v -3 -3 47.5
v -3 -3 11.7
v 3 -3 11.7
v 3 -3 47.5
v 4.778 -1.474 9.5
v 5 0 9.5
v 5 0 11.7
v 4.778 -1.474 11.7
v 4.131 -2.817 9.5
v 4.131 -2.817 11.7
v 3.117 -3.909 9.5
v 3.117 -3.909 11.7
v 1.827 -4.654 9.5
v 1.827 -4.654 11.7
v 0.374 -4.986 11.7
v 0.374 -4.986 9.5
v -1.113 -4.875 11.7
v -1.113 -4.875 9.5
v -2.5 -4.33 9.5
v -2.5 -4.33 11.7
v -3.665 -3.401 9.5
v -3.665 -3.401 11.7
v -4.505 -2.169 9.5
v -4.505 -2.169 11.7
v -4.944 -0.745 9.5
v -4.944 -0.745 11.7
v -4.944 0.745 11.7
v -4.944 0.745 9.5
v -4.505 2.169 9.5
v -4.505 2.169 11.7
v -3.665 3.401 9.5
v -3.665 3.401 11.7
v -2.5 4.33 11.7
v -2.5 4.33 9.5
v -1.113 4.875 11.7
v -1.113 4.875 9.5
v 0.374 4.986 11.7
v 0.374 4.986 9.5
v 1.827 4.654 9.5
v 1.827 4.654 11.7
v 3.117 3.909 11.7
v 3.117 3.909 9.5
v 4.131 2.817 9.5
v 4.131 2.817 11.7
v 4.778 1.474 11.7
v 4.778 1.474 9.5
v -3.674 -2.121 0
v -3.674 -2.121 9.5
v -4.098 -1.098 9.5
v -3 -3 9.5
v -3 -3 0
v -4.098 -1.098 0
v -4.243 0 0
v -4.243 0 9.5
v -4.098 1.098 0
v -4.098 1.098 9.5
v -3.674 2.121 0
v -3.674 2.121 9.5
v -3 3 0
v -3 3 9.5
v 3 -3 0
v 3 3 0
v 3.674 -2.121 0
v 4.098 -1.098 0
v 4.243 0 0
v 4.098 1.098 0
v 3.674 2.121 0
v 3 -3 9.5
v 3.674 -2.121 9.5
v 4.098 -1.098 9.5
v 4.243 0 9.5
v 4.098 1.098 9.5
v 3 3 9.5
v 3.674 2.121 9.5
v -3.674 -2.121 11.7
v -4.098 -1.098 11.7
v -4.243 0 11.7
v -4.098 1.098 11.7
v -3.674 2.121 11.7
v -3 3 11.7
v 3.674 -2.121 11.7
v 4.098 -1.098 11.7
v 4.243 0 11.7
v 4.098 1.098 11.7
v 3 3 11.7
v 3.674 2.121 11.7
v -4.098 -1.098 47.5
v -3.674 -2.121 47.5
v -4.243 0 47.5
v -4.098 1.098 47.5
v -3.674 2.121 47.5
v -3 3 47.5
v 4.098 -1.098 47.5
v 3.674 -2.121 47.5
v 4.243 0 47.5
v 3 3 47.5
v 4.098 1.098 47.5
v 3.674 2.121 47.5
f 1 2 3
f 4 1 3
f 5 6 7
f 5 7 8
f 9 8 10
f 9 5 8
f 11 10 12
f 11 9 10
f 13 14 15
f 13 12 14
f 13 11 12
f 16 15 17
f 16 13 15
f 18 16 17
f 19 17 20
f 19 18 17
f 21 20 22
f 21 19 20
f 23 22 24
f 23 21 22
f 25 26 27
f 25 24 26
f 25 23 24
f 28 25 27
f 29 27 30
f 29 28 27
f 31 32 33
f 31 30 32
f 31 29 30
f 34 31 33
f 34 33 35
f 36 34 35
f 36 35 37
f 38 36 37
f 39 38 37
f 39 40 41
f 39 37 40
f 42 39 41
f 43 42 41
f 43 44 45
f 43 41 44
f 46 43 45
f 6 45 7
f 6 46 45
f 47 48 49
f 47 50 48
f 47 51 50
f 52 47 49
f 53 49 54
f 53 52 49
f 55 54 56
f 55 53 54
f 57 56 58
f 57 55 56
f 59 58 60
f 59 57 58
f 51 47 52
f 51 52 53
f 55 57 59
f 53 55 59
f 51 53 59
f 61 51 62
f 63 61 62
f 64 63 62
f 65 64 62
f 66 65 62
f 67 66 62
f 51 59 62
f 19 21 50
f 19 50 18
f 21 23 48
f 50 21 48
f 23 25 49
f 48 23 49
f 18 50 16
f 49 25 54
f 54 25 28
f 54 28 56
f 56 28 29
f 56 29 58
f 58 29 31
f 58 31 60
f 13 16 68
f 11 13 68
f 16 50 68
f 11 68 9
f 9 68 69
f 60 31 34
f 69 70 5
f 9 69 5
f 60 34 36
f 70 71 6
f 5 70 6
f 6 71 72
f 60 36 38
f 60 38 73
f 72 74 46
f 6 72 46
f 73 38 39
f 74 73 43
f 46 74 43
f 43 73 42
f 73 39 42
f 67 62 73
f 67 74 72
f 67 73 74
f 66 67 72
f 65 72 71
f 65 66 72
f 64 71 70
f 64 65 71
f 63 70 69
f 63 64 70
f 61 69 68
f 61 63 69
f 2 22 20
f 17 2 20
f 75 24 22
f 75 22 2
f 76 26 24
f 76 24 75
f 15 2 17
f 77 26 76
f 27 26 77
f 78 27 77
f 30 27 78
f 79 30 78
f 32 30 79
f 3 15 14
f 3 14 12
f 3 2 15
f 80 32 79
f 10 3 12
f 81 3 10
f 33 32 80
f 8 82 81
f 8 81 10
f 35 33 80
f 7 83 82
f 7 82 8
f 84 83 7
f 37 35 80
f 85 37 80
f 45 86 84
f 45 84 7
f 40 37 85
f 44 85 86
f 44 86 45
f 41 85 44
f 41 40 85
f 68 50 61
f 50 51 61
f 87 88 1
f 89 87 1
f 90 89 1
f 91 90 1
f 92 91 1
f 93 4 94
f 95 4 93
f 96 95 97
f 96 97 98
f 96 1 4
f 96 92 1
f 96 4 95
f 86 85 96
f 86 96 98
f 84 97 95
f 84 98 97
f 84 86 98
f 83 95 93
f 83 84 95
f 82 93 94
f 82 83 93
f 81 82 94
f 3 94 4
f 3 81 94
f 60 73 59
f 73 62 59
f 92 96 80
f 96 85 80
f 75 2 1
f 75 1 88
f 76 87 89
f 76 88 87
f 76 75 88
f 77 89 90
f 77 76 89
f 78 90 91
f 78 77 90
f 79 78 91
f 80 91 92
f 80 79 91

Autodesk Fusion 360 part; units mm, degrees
sketch "Wheel_Ax_Sketch" plane through (0, 0, 0) normal (0, 0, 1) x (1, 0, 0)
  arc A0 (-3, 3) -> (-3, -3) centre (0, 0) ccw
  arc A1 (-3, 3) -> (-3, -3) centre (0, 0) ccw
  line L0 (-3, -3) -> (3, -3)
  arc A2 (3, -3) -> (3, 3) centre (0, 0) ccw
  line L1 (3, 3) -> (-3, 3)
  circle A3 centre (0, 0) radius 5
  dimension "d1" = 10
extrude "Extrude1" add sketch "Wheel_Ax_Sketch" along normal blind 47.5 contours A0 A1 L0 A2 L1
extrude "Extrude2" add sketch "Wheel_Ax_Sketch" along normal blind 2.2 from surface at 9.5
